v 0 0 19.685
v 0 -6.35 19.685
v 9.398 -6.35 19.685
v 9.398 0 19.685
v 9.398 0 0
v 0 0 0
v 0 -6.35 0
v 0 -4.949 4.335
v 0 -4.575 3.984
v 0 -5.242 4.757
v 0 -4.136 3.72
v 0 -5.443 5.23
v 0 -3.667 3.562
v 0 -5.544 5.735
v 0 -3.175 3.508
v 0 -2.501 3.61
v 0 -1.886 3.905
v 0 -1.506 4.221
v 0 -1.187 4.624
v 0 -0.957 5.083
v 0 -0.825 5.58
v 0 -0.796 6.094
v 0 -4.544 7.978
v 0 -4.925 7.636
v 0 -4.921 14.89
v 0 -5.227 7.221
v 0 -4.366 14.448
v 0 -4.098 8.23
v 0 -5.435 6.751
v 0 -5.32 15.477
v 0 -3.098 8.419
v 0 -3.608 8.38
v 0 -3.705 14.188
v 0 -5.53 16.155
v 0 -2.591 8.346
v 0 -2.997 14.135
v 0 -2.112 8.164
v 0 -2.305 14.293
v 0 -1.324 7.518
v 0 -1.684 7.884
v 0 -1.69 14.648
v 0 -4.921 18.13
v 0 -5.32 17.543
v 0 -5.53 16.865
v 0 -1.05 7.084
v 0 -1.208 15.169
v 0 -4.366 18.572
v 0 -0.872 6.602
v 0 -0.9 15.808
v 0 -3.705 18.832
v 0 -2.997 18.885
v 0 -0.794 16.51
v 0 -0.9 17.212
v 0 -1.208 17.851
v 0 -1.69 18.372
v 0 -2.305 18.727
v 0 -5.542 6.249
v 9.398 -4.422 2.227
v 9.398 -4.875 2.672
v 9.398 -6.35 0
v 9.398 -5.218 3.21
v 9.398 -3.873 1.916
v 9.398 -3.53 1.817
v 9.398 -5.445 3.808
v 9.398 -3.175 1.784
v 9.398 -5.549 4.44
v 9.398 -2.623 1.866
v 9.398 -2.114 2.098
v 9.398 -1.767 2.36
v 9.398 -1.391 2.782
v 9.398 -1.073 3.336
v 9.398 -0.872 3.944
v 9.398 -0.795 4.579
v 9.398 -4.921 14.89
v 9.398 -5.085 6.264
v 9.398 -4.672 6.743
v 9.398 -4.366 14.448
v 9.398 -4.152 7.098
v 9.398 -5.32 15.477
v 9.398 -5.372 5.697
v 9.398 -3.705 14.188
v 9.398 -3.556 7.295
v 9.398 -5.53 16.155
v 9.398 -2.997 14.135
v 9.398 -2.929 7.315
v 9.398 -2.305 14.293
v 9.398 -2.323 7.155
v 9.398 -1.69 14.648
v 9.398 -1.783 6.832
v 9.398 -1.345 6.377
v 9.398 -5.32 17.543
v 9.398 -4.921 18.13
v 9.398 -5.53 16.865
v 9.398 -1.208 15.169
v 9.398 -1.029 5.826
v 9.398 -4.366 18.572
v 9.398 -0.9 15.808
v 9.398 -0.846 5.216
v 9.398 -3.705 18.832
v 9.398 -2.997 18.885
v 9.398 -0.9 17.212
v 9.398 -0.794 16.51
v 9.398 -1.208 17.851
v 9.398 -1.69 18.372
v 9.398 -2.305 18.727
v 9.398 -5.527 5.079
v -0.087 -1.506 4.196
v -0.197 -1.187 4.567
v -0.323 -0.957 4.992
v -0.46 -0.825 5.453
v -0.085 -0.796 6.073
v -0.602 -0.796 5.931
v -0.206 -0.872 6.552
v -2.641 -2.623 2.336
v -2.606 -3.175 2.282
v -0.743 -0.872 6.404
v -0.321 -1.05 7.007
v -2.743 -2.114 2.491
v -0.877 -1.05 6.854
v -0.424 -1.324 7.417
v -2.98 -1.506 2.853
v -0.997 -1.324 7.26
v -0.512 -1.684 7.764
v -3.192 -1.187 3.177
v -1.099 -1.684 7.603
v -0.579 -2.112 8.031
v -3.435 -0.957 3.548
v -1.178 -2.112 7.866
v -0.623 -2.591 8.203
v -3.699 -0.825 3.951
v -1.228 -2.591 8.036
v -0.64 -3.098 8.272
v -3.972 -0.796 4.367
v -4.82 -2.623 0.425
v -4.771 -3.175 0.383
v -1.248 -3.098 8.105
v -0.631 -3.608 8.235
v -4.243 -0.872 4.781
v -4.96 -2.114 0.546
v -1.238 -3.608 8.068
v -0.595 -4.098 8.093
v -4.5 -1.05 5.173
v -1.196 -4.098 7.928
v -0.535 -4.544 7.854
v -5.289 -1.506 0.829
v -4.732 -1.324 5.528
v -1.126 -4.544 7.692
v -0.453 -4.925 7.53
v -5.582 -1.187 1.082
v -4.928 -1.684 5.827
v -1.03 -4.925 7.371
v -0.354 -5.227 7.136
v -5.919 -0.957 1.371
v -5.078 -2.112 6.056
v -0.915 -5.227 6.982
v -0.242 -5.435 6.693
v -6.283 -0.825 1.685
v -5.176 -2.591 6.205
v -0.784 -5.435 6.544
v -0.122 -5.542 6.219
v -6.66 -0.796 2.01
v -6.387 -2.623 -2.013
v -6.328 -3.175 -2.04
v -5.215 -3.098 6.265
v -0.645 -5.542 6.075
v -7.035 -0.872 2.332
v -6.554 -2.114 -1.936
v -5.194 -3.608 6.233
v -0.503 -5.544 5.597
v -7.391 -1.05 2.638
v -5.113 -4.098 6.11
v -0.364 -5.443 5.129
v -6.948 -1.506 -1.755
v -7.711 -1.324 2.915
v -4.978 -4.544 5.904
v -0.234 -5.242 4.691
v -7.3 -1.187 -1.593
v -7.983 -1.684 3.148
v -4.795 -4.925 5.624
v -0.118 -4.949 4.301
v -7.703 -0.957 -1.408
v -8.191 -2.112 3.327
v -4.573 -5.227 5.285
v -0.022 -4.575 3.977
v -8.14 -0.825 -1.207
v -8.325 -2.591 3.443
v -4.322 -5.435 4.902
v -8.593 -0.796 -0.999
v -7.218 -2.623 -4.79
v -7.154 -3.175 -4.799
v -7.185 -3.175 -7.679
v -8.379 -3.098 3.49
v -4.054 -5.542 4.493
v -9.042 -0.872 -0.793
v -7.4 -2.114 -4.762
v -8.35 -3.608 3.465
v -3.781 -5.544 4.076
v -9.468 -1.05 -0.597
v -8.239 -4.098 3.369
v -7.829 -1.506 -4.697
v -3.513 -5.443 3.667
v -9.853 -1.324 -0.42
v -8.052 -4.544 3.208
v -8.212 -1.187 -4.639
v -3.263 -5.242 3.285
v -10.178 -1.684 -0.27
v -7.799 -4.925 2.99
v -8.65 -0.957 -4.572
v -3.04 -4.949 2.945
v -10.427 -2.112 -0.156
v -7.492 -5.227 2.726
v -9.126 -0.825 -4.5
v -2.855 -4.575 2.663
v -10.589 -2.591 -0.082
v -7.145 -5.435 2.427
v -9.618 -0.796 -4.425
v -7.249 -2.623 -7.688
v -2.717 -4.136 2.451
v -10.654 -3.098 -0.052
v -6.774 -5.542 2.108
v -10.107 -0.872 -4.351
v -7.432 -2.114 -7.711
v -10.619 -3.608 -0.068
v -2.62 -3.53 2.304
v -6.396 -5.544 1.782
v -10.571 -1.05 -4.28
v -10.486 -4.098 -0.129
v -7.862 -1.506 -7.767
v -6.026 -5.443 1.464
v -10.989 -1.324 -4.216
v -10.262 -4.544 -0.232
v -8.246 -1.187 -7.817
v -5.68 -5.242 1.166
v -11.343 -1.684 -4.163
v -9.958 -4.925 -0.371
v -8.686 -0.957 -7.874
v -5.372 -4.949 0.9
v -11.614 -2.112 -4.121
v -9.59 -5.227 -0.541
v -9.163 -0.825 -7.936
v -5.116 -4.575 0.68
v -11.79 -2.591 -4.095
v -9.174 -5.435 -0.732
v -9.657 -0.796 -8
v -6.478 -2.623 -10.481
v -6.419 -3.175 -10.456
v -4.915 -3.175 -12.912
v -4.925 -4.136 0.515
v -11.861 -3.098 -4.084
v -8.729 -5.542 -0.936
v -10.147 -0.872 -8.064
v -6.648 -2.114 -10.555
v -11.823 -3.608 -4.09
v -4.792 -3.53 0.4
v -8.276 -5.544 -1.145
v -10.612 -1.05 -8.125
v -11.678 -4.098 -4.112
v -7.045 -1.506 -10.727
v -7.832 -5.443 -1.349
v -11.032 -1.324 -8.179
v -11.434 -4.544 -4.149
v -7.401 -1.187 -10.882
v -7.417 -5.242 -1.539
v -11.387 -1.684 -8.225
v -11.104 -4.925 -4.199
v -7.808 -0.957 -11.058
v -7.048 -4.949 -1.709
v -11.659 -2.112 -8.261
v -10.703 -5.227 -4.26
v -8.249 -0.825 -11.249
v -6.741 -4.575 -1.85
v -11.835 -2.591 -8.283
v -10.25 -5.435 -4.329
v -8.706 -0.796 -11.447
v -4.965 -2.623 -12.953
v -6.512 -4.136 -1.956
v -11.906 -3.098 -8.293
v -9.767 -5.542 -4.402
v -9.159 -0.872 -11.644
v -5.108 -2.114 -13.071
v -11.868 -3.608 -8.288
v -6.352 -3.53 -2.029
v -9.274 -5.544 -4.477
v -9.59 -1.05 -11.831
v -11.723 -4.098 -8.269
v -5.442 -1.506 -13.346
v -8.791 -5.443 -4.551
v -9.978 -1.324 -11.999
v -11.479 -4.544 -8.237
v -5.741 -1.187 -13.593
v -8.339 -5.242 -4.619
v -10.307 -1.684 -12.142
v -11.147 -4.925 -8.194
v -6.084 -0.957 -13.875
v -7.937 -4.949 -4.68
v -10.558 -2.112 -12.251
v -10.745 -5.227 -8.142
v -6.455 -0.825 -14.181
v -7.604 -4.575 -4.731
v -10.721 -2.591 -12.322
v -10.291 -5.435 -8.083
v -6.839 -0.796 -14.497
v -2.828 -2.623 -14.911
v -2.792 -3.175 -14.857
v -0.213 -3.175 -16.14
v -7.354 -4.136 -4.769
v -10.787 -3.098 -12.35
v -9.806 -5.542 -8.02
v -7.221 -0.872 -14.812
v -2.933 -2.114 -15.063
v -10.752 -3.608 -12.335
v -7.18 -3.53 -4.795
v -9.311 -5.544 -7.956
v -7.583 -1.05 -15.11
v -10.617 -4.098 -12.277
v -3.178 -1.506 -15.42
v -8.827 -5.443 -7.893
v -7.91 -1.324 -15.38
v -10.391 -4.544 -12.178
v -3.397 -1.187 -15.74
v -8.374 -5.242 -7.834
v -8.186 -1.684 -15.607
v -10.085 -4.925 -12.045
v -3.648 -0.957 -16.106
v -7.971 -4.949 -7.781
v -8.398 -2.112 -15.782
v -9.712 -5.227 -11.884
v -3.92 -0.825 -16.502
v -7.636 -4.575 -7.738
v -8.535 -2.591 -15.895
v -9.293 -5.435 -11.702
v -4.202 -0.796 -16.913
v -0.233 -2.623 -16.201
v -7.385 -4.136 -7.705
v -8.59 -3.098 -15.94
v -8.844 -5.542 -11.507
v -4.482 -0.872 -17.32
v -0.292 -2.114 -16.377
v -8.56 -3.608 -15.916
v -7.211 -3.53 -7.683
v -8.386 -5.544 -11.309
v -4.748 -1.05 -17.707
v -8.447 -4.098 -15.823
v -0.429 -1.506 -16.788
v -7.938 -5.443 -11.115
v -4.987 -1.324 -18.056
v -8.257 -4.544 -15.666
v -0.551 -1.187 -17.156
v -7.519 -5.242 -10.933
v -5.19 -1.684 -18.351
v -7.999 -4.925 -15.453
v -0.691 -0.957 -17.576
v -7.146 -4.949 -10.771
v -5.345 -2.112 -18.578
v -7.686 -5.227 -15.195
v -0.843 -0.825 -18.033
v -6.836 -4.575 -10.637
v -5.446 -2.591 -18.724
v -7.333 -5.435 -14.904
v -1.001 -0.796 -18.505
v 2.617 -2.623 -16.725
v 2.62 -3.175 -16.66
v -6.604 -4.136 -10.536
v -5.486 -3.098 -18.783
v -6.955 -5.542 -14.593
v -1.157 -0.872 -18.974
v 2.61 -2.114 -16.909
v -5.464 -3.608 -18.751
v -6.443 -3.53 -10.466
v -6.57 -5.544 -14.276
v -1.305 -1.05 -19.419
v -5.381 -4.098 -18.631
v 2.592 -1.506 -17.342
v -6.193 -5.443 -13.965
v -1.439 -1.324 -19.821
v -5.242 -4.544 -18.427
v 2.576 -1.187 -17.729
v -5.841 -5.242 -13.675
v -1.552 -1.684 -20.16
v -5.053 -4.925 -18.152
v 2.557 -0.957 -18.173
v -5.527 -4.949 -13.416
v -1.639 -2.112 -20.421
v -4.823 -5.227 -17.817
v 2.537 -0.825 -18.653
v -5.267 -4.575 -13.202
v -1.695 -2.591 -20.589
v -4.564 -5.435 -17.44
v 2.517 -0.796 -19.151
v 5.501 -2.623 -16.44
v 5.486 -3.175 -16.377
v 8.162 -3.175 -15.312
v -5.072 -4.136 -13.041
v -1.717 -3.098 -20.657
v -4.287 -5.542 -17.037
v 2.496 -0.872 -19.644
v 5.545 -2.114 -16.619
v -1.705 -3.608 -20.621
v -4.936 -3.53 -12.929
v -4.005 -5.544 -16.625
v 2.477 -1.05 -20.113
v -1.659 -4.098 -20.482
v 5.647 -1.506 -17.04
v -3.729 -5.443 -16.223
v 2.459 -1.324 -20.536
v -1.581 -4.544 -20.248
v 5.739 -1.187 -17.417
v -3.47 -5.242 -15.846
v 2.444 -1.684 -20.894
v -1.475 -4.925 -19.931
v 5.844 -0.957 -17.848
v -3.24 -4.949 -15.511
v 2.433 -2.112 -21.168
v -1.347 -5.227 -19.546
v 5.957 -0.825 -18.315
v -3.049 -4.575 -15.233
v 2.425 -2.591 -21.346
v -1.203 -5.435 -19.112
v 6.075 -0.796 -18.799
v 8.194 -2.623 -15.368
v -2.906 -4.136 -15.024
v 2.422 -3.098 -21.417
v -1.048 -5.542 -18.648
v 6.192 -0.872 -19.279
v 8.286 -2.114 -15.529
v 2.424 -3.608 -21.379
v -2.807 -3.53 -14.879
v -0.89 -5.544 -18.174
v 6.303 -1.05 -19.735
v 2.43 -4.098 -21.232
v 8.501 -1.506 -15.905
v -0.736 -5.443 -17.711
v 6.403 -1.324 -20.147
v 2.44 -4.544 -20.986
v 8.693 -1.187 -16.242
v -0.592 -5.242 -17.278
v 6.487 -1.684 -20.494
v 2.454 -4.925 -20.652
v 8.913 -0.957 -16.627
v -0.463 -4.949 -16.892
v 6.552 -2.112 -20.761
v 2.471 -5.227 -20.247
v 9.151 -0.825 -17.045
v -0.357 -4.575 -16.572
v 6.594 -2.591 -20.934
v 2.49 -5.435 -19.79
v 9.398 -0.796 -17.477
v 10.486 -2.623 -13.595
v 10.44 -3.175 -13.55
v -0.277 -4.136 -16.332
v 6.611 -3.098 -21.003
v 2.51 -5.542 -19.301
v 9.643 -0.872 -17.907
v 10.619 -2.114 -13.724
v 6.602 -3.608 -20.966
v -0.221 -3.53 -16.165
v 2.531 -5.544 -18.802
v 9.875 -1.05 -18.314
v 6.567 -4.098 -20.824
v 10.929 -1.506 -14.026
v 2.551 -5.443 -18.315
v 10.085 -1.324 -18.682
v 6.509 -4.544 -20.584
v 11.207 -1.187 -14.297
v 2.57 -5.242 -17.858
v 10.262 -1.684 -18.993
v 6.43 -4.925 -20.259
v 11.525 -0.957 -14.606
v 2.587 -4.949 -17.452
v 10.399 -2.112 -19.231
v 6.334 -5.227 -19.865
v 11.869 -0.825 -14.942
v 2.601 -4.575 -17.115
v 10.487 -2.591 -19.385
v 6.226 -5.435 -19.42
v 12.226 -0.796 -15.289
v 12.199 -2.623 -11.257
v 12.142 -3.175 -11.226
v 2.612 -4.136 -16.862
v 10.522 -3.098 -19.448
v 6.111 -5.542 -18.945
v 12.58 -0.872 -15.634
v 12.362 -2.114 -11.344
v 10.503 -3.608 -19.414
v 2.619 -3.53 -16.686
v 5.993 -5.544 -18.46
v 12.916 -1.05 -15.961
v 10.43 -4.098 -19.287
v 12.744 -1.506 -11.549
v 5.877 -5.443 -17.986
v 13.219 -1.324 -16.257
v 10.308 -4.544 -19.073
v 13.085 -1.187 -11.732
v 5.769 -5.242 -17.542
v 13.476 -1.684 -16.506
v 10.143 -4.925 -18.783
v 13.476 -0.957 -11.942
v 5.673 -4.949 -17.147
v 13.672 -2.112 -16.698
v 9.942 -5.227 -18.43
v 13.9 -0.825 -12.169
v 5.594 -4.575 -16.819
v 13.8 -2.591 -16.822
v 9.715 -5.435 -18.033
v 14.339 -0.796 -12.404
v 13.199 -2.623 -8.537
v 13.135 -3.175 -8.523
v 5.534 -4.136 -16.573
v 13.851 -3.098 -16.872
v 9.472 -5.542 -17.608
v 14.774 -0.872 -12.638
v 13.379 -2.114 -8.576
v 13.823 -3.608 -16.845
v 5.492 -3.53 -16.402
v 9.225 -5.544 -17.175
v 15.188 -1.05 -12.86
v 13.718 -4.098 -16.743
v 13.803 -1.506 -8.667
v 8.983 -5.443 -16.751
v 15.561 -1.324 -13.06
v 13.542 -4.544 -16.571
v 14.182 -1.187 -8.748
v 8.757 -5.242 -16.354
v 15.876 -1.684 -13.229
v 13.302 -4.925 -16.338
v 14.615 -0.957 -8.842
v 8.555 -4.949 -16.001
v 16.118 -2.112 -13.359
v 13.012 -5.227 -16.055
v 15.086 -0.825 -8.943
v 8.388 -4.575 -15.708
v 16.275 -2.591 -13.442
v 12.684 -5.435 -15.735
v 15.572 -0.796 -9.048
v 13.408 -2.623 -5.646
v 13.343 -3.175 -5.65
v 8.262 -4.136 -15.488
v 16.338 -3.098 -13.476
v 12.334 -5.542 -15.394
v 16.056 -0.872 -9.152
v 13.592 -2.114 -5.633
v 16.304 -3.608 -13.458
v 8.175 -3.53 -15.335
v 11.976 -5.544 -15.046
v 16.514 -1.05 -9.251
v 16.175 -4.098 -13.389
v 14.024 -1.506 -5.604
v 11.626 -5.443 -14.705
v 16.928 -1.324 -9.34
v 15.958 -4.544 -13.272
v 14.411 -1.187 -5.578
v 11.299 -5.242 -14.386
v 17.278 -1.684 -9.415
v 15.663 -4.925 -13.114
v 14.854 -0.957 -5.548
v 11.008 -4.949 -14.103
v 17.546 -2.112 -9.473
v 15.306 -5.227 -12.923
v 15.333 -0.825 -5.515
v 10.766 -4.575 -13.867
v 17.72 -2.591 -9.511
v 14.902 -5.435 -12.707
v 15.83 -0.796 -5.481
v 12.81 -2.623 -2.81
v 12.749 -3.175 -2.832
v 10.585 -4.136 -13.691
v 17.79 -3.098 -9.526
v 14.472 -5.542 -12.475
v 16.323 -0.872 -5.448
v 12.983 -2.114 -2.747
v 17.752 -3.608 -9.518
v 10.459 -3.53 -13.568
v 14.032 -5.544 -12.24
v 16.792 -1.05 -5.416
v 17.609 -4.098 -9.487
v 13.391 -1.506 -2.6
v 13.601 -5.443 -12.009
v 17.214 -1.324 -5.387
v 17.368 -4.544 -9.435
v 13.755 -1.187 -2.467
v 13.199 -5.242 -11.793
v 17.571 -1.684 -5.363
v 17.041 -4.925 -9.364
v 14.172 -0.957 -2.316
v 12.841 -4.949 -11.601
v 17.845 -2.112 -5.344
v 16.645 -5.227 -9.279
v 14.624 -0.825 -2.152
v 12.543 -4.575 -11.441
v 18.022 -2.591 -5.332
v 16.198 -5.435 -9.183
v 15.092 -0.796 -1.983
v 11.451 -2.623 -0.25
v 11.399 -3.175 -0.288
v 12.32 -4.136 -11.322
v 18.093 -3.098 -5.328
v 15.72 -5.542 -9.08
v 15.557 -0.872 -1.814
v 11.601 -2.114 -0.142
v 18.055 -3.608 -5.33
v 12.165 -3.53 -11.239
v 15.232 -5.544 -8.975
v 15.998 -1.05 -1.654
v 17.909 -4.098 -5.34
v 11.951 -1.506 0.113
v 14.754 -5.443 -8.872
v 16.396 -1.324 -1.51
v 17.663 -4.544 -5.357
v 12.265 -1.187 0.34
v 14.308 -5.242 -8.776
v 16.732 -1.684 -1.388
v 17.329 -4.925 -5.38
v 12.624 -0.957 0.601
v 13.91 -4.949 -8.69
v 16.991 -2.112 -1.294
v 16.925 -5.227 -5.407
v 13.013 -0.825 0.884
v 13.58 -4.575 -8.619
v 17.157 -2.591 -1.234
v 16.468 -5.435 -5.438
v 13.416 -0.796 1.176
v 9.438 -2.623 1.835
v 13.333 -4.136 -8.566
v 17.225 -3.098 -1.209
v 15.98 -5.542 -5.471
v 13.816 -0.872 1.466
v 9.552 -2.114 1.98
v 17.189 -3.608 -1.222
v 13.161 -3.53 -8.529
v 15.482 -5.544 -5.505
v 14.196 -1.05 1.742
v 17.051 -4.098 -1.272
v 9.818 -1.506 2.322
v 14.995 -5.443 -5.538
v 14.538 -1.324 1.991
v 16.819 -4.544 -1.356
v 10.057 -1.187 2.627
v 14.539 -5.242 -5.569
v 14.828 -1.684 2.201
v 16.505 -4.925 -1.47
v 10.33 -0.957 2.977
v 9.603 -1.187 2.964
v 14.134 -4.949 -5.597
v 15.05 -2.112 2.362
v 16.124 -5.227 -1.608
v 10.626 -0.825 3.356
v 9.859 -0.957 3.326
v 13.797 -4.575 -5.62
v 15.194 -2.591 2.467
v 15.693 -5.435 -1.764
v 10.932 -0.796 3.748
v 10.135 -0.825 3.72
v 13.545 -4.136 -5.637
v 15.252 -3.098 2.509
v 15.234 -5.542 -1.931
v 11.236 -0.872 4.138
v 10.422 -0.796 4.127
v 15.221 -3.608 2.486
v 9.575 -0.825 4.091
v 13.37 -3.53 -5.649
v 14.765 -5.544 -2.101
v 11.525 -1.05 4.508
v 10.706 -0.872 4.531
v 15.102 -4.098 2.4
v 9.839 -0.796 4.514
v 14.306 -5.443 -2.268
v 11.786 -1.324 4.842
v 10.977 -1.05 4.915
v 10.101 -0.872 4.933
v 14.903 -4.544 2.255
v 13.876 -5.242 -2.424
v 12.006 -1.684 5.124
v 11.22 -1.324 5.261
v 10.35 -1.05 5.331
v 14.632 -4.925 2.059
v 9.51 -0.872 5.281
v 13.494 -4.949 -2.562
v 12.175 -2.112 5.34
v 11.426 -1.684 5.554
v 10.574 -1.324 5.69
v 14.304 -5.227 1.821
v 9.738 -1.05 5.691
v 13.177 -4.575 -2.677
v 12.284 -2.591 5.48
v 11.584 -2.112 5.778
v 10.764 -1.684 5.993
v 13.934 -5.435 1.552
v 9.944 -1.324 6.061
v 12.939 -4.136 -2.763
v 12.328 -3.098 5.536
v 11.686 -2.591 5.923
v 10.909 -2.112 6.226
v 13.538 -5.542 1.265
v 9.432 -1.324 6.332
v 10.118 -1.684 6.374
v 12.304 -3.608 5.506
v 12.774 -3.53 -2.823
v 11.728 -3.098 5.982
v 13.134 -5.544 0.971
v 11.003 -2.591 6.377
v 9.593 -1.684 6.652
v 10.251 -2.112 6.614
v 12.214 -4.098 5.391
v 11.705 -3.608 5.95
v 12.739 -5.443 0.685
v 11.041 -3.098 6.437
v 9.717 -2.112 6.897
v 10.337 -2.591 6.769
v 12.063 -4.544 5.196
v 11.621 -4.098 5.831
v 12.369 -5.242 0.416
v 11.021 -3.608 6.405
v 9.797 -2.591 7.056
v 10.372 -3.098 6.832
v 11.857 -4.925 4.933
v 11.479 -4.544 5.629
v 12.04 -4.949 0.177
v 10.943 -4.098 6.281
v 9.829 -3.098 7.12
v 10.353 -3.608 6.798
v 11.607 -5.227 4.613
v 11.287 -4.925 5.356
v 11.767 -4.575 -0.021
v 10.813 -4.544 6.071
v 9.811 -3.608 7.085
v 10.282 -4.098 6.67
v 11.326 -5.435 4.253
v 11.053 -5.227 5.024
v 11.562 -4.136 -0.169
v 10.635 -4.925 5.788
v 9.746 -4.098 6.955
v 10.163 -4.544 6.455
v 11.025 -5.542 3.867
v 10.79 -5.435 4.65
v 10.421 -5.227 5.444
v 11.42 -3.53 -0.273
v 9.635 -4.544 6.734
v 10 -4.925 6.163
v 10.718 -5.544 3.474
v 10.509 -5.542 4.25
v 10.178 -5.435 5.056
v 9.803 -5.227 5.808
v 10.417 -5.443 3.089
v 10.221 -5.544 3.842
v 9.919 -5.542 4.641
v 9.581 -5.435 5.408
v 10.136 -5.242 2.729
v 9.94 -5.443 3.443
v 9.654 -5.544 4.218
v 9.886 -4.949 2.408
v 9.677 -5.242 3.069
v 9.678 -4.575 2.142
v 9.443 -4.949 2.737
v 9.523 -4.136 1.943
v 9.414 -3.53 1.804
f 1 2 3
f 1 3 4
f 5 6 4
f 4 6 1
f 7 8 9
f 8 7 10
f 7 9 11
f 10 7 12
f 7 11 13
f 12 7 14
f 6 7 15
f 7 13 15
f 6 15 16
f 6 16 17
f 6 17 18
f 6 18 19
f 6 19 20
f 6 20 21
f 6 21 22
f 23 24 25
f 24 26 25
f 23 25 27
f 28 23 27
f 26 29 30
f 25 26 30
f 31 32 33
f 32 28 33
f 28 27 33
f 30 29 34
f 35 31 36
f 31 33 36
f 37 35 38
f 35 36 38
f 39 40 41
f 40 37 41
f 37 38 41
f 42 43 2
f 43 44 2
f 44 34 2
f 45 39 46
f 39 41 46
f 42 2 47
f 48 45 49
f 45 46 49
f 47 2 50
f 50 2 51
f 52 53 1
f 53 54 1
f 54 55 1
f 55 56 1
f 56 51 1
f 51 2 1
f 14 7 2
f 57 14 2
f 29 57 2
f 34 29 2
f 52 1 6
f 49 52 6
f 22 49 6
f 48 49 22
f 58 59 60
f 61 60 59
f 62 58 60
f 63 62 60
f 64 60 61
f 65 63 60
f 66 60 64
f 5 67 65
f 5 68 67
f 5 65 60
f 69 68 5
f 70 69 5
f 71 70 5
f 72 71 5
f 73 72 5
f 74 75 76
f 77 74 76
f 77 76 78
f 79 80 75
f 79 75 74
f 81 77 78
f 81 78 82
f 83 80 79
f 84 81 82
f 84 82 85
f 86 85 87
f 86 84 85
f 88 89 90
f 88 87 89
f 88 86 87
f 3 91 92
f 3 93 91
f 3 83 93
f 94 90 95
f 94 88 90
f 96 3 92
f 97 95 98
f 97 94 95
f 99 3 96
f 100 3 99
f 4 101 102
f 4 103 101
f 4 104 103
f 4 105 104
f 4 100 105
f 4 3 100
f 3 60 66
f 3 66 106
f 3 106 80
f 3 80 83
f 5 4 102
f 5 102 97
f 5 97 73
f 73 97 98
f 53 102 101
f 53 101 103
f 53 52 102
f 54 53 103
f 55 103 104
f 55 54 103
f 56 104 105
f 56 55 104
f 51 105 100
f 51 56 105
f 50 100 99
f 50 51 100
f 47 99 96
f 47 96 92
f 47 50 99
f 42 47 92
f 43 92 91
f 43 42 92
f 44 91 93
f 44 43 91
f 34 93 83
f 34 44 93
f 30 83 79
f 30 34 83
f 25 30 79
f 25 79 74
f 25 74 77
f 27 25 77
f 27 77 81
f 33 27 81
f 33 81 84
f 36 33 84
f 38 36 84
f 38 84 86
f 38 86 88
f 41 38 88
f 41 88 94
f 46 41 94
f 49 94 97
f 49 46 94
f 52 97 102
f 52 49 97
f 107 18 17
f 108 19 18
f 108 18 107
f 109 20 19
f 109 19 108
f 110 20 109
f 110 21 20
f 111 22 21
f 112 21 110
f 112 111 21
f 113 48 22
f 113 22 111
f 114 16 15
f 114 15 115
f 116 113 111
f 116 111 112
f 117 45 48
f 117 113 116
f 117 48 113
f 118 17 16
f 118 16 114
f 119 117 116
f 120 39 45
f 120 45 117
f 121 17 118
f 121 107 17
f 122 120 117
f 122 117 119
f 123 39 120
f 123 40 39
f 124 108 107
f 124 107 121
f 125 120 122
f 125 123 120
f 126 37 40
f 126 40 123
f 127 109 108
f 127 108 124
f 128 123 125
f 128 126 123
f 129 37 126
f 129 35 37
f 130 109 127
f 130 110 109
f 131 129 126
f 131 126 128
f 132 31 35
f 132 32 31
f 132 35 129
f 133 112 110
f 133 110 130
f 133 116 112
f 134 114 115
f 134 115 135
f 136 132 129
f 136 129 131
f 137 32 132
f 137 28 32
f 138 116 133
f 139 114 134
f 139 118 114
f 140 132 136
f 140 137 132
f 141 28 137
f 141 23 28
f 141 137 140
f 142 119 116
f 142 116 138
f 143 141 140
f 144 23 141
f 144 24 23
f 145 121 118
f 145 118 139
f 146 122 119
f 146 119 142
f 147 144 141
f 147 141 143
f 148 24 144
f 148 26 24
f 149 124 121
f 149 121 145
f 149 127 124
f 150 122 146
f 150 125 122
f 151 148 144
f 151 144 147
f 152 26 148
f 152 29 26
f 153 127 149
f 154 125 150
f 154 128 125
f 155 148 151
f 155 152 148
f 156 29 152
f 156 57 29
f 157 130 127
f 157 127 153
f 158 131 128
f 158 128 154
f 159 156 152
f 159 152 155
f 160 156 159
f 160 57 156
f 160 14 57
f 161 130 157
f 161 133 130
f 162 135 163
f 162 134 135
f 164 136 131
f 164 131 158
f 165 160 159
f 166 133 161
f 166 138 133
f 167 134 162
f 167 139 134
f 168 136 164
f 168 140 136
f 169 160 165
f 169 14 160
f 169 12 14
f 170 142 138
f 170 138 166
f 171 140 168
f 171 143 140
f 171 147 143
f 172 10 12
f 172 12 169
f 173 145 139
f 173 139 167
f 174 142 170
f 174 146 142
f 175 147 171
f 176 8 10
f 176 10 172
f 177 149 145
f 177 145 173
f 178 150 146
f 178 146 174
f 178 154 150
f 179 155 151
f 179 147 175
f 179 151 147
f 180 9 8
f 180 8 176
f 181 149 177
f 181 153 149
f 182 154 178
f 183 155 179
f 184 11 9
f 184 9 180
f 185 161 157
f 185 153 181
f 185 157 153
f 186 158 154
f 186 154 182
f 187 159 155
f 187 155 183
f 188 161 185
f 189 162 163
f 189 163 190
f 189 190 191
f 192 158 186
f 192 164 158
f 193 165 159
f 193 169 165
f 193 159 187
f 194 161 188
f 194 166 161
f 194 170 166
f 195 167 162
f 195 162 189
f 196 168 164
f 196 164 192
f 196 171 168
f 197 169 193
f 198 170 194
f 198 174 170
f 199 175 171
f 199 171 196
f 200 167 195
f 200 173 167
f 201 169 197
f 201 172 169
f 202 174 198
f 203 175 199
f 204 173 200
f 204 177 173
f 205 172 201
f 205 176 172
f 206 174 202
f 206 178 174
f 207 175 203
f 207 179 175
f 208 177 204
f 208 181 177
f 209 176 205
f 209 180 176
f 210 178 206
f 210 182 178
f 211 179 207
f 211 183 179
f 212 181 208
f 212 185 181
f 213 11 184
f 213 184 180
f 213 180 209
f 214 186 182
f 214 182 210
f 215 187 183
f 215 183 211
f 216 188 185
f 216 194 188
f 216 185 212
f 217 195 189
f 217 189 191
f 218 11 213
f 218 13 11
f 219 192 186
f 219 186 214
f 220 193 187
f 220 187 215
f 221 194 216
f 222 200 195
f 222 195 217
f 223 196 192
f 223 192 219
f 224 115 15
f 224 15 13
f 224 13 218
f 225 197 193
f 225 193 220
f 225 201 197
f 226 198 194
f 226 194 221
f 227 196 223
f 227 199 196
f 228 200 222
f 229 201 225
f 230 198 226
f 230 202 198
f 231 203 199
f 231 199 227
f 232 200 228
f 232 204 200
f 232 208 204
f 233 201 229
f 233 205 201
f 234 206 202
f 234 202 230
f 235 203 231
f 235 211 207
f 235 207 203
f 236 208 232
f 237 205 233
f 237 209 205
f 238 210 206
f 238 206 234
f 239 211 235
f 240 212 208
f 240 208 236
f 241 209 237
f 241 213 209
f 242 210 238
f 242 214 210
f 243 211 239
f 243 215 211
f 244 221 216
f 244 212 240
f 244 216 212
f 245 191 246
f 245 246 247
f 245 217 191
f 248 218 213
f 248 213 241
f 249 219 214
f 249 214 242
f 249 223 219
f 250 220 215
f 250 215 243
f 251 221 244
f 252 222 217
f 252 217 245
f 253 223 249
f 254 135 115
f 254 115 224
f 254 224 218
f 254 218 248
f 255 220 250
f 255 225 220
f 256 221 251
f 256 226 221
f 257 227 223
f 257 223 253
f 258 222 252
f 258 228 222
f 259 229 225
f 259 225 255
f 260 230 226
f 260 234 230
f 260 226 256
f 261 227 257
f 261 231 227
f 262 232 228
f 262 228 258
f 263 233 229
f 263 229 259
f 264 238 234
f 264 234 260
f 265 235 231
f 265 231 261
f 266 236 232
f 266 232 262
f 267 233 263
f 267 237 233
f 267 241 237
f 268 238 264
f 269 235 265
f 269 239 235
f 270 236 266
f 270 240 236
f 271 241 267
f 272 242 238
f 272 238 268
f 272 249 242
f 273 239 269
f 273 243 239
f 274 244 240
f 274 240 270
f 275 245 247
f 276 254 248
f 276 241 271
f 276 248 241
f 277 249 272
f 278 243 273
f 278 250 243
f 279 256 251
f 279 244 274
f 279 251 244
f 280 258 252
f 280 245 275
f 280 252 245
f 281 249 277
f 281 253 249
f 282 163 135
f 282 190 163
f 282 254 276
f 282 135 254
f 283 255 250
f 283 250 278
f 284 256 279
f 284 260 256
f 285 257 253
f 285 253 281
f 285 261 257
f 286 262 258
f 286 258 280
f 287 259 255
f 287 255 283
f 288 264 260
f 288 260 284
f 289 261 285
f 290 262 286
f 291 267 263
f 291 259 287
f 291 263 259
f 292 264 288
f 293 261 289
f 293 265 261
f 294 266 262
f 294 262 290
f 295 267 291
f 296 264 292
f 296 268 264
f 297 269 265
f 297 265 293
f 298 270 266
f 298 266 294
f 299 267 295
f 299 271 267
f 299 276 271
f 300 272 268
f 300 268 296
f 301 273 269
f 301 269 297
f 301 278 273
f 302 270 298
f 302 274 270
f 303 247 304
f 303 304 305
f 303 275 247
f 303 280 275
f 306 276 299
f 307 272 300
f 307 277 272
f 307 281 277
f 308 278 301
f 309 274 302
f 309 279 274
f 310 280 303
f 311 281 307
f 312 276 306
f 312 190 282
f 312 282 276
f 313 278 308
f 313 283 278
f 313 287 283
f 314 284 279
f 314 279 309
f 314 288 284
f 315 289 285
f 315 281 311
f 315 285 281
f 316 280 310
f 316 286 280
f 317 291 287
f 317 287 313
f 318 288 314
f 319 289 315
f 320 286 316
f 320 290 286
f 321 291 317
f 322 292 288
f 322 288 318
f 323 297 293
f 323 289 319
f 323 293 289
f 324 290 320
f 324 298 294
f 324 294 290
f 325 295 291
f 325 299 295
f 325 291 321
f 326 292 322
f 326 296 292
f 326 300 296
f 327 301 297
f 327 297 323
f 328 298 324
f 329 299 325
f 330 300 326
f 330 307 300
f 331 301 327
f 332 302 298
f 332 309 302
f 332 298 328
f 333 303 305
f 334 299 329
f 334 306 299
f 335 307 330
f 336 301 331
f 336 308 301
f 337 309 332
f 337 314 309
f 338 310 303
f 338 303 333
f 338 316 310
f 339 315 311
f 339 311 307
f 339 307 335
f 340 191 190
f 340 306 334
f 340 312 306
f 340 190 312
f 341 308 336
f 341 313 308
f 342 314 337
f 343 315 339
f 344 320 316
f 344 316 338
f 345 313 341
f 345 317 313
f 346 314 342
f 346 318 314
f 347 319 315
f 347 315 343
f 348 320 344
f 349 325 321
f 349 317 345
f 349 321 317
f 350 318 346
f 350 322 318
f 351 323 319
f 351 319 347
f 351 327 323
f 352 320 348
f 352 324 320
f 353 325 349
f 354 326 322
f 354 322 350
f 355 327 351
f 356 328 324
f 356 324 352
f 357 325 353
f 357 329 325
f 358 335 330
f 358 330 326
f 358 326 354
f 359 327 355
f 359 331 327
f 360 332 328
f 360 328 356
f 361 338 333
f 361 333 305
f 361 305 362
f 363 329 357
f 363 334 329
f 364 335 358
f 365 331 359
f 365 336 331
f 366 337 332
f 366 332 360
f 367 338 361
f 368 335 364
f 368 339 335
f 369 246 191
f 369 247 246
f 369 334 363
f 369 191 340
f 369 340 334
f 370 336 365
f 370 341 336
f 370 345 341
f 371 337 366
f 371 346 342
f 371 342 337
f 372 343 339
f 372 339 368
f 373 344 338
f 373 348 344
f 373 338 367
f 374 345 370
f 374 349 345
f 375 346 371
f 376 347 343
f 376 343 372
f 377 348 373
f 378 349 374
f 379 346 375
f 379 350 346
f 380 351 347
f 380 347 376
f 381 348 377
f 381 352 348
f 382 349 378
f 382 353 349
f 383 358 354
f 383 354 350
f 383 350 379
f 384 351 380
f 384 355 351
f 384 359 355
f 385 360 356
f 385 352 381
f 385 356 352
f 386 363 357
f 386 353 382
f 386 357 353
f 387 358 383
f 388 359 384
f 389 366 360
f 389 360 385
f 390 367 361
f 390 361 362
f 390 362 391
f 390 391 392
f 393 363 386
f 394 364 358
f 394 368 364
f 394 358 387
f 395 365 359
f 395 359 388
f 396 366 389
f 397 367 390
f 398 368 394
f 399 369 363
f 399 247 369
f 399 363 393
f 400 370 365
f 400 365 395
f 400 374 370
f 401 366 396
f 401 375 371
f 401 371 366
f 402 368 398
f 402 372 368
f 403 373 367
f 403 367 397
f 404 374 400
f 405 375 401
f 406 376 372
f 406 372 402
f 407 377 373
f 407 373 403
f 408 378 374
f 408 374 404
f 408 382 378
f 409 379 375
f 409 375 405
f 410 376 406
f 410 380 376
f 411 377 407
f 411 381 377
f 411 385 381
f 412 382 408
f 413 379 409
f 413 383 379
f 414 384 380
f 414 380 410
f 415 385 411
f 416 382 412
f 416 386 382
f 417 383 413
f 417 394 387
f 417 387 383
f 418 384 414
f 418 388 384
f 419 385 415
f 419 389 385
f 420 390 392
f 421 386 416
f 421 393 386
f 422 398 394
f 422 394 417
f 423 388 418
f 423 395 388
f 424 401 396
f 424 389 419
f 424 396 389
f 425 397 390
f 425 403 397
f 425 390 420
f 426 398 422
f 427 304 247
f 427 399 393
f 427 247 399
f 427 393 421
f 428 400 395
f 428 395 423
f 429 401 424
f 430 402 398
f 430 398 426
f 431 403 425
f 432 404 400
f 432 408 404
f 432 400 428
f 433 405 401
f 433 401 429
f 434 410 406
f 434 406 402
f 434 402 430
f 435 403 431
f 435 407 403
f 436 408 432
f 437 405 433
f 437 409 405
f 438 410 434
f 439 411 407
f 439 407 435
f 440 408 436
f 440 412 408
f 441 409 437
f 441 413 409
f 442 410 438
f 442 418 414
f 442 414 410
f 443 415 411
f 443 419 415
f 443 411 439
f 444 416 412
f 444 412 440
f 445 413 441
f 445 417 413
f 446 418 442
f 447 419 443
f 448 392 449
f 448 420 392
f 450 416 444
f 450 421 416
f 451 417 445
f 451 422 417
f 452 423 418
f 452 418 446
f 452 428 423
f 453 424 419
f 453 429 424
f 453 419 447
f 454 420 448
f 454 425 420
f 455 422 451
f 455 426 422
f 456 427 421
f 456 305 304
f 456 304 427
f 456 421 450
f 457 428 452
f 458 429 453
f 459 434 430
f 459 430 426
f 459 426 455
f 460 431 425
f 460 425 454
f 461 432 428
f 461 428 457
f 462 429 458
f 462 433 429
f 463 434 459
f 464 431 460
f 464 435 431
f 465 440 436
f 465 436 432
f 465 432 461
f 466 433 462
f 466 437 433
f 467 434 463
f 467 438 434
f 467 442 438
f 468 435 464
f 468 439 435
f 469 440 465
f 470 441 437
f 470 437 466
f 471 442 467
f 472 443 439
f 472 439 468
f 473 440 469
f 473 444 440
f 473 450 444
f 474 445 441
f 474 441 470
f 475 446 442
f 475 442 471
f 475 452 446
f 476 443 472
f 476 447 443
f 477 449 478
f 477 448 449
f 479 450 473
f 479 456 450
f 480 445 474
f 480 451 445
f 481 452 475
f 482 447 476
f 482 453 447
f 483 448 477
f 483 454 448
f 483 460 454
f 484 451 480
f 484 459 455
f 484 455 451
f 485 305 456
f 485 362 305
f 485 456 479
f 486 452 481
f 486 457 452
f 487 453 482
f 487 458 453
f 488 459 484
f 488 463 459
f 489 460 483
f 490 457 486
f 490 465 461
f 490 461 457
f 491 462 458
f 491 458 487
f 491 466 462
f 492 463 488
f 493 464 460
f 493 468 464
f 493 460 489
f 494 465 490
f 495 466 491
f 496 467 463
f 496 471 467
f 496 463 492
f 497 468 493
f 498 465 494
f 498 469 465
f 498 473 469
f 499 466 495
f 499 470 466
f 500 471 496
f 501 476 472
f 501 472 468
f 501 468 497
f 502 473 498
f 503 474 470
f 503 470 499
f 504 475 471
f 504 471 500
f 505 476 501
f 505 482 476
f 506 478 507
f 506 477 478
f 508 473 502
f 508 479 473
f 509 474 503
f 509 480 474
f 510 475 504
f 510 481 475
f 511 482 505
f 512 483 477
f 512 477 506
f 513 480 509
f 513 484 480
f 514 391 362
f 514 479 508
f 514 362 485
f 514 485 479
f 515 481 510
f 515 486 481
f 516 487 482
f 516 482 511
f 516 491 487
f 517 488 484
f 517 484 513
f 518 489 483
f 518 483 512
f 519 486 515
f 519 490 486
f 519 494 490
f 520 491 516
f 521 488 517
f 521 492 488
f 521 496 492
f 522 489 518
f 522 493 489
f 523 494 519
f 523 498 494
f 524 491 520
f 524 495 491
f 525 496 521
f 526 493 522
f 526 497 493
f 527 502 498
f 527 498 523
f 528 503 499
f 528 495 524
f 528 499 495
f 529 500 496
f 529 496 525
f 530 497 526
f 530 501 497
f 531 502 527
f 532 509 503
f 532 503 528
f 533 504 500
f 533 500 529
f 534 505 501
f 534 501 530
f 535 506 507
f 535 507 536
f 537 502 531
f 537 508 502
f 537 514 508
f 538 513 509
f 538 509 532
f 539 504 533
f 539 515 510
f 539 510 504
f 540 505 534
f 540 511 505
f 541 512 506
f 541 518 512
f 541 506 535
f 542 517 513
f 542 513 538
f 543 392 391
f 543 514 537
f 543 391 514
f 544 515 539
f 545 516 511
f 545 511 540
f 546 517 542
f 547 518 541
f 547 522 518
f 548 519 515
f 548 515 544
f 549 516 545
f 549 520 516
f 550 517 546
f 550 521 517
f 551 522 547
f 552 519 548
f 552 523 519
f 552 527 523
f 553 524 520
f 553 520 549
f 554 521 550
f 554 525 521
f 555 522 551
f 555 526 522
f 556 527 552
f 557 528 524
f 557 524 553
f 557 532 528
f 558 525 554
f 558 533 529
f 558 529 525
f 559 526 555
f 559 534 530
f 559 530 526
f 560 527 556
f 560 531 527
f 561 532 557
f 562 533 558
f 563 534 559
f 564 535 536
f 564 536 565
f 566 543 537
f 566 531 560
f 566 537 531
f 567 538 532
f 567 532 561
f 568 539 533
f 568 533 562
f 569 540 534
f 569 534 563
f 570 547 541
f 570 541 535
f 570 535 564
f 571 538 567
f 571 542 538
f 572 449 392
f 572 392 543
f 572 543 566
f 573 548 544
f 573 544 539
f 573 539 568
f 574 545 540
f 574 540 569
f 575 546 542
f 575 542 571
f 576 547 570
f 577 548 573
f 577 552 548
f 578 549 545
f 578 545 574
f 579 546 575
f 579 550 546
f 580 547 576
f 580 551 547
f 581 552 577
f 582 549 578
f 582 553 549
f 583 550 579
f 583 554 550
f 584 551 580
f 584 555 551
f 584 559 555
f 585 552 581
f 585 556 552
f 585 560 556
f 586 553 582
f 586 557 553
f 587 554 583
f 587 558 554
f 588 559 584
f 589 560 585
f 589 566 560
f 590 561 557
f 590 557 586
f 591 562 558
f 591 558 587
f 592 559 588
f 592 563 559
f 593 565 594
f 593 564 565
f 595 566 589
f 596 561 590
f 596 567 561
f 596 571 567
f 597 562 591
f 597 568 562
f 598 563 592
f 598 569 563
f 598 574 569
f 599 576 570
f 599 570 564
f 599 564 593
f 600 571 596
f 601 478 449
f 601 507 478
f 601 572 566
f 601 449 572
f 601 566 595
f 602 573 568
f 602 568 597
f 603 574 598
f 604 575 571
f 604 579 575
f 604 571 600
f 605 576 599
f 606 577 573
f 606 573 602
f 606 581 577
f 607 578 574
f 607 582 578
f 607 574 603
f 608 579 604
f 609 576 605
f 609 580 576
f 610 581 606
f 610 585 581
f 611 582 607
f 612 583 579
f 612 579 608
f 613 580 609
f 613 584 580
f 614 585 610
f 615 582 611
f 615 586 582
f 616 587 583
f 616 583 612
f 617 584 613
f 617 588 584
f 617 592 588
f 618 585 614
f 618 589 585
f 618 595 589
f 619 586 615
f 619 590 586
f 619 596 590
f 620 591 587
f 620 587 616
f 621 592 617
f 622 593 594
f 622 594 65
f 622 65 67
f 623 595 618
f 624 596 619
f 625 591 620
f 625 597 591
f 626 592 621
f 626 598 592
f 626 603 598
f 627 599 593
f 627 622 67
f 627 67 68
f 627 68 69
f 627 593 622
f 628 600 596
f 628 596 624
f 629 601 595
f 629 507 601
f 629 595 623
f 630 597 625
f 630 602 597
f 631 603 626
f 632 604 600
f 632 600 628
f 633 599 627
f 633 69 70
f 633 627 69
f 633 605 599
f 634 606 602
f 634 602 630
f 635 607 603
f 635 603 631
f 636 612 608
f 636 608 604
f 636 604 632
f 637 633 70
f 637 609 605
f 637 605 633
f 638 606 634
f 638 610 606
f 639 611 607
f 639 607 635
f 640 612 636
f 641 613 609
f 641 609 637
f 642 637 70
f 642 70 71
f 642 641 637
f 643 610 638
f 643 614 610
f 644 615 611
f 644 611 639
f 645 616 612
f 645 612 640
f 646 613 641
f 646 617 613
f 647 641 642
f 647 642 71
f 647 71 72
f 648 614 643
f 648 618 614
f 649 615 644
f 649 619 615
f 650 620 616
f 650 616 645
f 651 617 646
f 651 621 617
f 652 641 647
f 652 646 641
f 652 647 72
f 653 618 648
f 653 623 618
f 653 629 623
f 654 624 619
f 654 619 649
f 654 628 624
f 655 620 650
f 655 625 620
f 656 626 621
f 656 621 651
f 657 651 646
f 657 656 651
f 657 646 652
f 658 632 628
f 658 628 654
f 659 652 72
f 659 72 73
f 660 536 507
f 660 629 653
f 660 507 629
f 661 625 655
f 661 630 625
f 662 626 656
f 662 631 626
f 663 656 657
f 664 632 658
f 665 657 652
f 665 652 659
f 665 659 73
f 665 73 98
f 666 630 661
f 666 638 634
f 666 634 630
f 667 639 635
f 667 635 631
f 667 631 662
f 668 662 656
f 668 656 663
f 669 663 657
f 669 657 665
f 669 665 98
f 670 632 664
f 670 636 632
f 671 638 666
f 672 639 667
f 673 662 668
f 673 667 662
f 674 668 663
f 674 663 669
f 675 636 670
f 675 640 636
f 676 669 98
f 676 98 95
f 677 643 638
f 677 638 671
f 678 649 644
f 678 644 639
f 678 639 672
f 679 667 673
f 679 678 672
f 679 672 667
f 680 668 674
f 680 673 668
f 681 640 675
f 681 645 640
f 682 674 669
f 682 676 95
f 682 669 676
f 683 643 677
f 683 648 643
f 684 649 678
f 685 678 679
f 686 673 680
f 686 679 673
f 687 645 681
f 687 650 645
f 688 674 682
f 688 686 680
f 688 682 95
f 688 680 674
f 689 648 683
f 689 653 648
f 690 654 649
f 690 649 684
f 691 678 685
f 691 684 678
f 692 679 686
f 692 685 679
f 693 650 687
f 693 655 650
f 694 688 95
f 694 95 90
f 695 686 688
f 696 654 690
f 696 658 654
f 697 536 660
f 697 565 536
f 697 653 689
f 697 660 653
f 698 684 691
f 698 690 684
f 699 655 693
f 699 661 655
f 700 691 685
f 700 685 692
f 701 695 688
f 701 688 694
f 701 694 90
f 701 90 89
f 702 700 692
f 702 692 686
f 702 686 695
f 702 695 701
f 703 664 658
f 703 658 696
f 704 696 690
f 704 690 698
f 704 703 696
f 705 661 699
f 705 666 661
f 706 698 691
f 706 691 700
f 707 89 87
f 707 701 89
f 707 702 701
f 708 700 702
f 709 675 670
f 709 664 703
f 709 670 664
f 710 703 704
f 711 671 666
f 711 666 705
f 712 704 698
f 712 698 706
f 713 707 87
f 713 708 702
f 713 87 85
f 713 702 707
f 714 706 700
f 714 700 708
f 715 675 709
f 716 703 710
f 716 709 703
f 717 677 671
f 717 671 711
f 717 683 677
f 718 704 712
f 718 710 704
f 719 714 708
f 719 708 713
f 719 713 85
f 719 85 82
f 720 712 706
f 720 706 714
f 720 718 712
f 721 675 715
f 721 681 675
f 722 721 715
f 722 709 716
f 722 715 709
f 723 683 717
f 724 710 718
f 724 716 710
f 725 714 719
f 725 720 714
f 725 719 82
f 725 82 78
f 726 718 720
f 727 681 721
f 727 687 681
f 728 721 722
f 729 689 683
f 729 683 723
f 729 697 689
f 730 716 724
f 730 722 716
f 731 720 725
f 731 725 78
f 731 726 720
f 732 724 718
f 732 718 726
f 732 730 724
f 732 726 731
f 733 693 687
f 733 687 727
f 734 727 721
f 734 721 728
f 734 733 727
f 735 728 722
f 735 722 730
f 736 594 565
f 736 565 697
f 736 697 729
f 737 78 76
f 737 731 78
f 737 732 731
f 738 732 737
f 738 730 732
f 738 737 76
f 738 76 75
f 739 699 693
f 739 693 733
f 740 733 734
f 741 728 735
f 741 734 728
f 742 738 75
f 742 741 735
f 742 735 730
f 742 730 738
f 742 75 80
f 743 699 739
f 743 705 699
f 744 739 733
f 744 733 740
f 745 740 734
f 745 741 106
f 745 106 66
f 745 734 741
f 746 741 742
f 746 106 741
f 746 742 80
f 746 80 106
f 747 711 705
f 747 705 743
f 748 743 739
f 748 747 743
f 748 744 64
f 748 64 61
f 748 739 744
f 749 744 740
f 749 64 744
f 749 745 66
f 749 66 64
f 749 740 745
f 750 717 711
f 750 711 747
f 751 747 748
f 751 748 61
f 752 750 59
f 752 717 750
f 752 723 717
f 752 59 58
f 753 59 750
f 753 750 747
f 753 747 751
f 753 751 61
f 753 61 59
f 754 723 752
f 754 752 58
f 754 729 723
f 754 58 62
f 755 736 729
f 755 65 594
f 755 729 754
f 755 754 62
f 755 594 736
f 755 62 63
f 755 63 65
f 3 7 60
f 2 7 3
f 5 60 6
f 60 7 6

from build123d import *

# Parameters (mm, degrees)
F0_W           = 6.35
F0_H           = 19.685
F0_R           = 2.38125
F1_DEPTH       = 3.048
F3_ANGLE_START = 10
F3_ANGLE       = 349
F4_W           = 6.35
F4_H           = 19.685
F4_R           = 2.38125
F5_DEPTH       = 6.35


with BuildPart() as f1:
    # F0 (on Right) → F1 (new body)
    with BuildSketch(Plane.YZ):
        with Locations((-3.175, 9.8425)):
            Rectangle(F0_W, F0_H)
        with Locations((-3.175, 16.51)):
            Circle(F0_R, mode=Mode.SUBTRACT)
    extrude(amount=F1_DEPTH)

    # F2 (on face) → F3 (revolve)
    with BuildSketch(Plane.YZ.offset(3.048), mode=Mode.PRIVATE) as f3_sk:
        with BuildLine():
            ThreePointArc((-0.79375, 6.35), (-4.8587980227, 8.0337980227), (-3.175, 3.96875))
            ThreePointArc((-3.175, 3.96875), (-1.4912019773, 4.6662019773), (-0.79375, 6.35))
        make_face()
    revolve(f3_sk.sketch.rotate(Axis((3.048, -5.2748635836, -6.35), (0, -1, 0)), F3_ANGLE_START), axis=Axis((3.048, -5.2748635836, -6.35), (0, -1, 0)), revolution_arc=F3_ANGLE)

    # F4 (on face) → F5 (join)
    with BuildSketch(Plane.YZ.offset(3.048)):
        with Locations((-3.175, 9.8425)):
            Rectangle(F4_W, F4_H)
        with Locations((-3.175, 16.51)):
            Circle(F4_R, mode=Mode.SUBTRACT)
    extrude(amount=F5_DEPTH)


solid = f1.part
